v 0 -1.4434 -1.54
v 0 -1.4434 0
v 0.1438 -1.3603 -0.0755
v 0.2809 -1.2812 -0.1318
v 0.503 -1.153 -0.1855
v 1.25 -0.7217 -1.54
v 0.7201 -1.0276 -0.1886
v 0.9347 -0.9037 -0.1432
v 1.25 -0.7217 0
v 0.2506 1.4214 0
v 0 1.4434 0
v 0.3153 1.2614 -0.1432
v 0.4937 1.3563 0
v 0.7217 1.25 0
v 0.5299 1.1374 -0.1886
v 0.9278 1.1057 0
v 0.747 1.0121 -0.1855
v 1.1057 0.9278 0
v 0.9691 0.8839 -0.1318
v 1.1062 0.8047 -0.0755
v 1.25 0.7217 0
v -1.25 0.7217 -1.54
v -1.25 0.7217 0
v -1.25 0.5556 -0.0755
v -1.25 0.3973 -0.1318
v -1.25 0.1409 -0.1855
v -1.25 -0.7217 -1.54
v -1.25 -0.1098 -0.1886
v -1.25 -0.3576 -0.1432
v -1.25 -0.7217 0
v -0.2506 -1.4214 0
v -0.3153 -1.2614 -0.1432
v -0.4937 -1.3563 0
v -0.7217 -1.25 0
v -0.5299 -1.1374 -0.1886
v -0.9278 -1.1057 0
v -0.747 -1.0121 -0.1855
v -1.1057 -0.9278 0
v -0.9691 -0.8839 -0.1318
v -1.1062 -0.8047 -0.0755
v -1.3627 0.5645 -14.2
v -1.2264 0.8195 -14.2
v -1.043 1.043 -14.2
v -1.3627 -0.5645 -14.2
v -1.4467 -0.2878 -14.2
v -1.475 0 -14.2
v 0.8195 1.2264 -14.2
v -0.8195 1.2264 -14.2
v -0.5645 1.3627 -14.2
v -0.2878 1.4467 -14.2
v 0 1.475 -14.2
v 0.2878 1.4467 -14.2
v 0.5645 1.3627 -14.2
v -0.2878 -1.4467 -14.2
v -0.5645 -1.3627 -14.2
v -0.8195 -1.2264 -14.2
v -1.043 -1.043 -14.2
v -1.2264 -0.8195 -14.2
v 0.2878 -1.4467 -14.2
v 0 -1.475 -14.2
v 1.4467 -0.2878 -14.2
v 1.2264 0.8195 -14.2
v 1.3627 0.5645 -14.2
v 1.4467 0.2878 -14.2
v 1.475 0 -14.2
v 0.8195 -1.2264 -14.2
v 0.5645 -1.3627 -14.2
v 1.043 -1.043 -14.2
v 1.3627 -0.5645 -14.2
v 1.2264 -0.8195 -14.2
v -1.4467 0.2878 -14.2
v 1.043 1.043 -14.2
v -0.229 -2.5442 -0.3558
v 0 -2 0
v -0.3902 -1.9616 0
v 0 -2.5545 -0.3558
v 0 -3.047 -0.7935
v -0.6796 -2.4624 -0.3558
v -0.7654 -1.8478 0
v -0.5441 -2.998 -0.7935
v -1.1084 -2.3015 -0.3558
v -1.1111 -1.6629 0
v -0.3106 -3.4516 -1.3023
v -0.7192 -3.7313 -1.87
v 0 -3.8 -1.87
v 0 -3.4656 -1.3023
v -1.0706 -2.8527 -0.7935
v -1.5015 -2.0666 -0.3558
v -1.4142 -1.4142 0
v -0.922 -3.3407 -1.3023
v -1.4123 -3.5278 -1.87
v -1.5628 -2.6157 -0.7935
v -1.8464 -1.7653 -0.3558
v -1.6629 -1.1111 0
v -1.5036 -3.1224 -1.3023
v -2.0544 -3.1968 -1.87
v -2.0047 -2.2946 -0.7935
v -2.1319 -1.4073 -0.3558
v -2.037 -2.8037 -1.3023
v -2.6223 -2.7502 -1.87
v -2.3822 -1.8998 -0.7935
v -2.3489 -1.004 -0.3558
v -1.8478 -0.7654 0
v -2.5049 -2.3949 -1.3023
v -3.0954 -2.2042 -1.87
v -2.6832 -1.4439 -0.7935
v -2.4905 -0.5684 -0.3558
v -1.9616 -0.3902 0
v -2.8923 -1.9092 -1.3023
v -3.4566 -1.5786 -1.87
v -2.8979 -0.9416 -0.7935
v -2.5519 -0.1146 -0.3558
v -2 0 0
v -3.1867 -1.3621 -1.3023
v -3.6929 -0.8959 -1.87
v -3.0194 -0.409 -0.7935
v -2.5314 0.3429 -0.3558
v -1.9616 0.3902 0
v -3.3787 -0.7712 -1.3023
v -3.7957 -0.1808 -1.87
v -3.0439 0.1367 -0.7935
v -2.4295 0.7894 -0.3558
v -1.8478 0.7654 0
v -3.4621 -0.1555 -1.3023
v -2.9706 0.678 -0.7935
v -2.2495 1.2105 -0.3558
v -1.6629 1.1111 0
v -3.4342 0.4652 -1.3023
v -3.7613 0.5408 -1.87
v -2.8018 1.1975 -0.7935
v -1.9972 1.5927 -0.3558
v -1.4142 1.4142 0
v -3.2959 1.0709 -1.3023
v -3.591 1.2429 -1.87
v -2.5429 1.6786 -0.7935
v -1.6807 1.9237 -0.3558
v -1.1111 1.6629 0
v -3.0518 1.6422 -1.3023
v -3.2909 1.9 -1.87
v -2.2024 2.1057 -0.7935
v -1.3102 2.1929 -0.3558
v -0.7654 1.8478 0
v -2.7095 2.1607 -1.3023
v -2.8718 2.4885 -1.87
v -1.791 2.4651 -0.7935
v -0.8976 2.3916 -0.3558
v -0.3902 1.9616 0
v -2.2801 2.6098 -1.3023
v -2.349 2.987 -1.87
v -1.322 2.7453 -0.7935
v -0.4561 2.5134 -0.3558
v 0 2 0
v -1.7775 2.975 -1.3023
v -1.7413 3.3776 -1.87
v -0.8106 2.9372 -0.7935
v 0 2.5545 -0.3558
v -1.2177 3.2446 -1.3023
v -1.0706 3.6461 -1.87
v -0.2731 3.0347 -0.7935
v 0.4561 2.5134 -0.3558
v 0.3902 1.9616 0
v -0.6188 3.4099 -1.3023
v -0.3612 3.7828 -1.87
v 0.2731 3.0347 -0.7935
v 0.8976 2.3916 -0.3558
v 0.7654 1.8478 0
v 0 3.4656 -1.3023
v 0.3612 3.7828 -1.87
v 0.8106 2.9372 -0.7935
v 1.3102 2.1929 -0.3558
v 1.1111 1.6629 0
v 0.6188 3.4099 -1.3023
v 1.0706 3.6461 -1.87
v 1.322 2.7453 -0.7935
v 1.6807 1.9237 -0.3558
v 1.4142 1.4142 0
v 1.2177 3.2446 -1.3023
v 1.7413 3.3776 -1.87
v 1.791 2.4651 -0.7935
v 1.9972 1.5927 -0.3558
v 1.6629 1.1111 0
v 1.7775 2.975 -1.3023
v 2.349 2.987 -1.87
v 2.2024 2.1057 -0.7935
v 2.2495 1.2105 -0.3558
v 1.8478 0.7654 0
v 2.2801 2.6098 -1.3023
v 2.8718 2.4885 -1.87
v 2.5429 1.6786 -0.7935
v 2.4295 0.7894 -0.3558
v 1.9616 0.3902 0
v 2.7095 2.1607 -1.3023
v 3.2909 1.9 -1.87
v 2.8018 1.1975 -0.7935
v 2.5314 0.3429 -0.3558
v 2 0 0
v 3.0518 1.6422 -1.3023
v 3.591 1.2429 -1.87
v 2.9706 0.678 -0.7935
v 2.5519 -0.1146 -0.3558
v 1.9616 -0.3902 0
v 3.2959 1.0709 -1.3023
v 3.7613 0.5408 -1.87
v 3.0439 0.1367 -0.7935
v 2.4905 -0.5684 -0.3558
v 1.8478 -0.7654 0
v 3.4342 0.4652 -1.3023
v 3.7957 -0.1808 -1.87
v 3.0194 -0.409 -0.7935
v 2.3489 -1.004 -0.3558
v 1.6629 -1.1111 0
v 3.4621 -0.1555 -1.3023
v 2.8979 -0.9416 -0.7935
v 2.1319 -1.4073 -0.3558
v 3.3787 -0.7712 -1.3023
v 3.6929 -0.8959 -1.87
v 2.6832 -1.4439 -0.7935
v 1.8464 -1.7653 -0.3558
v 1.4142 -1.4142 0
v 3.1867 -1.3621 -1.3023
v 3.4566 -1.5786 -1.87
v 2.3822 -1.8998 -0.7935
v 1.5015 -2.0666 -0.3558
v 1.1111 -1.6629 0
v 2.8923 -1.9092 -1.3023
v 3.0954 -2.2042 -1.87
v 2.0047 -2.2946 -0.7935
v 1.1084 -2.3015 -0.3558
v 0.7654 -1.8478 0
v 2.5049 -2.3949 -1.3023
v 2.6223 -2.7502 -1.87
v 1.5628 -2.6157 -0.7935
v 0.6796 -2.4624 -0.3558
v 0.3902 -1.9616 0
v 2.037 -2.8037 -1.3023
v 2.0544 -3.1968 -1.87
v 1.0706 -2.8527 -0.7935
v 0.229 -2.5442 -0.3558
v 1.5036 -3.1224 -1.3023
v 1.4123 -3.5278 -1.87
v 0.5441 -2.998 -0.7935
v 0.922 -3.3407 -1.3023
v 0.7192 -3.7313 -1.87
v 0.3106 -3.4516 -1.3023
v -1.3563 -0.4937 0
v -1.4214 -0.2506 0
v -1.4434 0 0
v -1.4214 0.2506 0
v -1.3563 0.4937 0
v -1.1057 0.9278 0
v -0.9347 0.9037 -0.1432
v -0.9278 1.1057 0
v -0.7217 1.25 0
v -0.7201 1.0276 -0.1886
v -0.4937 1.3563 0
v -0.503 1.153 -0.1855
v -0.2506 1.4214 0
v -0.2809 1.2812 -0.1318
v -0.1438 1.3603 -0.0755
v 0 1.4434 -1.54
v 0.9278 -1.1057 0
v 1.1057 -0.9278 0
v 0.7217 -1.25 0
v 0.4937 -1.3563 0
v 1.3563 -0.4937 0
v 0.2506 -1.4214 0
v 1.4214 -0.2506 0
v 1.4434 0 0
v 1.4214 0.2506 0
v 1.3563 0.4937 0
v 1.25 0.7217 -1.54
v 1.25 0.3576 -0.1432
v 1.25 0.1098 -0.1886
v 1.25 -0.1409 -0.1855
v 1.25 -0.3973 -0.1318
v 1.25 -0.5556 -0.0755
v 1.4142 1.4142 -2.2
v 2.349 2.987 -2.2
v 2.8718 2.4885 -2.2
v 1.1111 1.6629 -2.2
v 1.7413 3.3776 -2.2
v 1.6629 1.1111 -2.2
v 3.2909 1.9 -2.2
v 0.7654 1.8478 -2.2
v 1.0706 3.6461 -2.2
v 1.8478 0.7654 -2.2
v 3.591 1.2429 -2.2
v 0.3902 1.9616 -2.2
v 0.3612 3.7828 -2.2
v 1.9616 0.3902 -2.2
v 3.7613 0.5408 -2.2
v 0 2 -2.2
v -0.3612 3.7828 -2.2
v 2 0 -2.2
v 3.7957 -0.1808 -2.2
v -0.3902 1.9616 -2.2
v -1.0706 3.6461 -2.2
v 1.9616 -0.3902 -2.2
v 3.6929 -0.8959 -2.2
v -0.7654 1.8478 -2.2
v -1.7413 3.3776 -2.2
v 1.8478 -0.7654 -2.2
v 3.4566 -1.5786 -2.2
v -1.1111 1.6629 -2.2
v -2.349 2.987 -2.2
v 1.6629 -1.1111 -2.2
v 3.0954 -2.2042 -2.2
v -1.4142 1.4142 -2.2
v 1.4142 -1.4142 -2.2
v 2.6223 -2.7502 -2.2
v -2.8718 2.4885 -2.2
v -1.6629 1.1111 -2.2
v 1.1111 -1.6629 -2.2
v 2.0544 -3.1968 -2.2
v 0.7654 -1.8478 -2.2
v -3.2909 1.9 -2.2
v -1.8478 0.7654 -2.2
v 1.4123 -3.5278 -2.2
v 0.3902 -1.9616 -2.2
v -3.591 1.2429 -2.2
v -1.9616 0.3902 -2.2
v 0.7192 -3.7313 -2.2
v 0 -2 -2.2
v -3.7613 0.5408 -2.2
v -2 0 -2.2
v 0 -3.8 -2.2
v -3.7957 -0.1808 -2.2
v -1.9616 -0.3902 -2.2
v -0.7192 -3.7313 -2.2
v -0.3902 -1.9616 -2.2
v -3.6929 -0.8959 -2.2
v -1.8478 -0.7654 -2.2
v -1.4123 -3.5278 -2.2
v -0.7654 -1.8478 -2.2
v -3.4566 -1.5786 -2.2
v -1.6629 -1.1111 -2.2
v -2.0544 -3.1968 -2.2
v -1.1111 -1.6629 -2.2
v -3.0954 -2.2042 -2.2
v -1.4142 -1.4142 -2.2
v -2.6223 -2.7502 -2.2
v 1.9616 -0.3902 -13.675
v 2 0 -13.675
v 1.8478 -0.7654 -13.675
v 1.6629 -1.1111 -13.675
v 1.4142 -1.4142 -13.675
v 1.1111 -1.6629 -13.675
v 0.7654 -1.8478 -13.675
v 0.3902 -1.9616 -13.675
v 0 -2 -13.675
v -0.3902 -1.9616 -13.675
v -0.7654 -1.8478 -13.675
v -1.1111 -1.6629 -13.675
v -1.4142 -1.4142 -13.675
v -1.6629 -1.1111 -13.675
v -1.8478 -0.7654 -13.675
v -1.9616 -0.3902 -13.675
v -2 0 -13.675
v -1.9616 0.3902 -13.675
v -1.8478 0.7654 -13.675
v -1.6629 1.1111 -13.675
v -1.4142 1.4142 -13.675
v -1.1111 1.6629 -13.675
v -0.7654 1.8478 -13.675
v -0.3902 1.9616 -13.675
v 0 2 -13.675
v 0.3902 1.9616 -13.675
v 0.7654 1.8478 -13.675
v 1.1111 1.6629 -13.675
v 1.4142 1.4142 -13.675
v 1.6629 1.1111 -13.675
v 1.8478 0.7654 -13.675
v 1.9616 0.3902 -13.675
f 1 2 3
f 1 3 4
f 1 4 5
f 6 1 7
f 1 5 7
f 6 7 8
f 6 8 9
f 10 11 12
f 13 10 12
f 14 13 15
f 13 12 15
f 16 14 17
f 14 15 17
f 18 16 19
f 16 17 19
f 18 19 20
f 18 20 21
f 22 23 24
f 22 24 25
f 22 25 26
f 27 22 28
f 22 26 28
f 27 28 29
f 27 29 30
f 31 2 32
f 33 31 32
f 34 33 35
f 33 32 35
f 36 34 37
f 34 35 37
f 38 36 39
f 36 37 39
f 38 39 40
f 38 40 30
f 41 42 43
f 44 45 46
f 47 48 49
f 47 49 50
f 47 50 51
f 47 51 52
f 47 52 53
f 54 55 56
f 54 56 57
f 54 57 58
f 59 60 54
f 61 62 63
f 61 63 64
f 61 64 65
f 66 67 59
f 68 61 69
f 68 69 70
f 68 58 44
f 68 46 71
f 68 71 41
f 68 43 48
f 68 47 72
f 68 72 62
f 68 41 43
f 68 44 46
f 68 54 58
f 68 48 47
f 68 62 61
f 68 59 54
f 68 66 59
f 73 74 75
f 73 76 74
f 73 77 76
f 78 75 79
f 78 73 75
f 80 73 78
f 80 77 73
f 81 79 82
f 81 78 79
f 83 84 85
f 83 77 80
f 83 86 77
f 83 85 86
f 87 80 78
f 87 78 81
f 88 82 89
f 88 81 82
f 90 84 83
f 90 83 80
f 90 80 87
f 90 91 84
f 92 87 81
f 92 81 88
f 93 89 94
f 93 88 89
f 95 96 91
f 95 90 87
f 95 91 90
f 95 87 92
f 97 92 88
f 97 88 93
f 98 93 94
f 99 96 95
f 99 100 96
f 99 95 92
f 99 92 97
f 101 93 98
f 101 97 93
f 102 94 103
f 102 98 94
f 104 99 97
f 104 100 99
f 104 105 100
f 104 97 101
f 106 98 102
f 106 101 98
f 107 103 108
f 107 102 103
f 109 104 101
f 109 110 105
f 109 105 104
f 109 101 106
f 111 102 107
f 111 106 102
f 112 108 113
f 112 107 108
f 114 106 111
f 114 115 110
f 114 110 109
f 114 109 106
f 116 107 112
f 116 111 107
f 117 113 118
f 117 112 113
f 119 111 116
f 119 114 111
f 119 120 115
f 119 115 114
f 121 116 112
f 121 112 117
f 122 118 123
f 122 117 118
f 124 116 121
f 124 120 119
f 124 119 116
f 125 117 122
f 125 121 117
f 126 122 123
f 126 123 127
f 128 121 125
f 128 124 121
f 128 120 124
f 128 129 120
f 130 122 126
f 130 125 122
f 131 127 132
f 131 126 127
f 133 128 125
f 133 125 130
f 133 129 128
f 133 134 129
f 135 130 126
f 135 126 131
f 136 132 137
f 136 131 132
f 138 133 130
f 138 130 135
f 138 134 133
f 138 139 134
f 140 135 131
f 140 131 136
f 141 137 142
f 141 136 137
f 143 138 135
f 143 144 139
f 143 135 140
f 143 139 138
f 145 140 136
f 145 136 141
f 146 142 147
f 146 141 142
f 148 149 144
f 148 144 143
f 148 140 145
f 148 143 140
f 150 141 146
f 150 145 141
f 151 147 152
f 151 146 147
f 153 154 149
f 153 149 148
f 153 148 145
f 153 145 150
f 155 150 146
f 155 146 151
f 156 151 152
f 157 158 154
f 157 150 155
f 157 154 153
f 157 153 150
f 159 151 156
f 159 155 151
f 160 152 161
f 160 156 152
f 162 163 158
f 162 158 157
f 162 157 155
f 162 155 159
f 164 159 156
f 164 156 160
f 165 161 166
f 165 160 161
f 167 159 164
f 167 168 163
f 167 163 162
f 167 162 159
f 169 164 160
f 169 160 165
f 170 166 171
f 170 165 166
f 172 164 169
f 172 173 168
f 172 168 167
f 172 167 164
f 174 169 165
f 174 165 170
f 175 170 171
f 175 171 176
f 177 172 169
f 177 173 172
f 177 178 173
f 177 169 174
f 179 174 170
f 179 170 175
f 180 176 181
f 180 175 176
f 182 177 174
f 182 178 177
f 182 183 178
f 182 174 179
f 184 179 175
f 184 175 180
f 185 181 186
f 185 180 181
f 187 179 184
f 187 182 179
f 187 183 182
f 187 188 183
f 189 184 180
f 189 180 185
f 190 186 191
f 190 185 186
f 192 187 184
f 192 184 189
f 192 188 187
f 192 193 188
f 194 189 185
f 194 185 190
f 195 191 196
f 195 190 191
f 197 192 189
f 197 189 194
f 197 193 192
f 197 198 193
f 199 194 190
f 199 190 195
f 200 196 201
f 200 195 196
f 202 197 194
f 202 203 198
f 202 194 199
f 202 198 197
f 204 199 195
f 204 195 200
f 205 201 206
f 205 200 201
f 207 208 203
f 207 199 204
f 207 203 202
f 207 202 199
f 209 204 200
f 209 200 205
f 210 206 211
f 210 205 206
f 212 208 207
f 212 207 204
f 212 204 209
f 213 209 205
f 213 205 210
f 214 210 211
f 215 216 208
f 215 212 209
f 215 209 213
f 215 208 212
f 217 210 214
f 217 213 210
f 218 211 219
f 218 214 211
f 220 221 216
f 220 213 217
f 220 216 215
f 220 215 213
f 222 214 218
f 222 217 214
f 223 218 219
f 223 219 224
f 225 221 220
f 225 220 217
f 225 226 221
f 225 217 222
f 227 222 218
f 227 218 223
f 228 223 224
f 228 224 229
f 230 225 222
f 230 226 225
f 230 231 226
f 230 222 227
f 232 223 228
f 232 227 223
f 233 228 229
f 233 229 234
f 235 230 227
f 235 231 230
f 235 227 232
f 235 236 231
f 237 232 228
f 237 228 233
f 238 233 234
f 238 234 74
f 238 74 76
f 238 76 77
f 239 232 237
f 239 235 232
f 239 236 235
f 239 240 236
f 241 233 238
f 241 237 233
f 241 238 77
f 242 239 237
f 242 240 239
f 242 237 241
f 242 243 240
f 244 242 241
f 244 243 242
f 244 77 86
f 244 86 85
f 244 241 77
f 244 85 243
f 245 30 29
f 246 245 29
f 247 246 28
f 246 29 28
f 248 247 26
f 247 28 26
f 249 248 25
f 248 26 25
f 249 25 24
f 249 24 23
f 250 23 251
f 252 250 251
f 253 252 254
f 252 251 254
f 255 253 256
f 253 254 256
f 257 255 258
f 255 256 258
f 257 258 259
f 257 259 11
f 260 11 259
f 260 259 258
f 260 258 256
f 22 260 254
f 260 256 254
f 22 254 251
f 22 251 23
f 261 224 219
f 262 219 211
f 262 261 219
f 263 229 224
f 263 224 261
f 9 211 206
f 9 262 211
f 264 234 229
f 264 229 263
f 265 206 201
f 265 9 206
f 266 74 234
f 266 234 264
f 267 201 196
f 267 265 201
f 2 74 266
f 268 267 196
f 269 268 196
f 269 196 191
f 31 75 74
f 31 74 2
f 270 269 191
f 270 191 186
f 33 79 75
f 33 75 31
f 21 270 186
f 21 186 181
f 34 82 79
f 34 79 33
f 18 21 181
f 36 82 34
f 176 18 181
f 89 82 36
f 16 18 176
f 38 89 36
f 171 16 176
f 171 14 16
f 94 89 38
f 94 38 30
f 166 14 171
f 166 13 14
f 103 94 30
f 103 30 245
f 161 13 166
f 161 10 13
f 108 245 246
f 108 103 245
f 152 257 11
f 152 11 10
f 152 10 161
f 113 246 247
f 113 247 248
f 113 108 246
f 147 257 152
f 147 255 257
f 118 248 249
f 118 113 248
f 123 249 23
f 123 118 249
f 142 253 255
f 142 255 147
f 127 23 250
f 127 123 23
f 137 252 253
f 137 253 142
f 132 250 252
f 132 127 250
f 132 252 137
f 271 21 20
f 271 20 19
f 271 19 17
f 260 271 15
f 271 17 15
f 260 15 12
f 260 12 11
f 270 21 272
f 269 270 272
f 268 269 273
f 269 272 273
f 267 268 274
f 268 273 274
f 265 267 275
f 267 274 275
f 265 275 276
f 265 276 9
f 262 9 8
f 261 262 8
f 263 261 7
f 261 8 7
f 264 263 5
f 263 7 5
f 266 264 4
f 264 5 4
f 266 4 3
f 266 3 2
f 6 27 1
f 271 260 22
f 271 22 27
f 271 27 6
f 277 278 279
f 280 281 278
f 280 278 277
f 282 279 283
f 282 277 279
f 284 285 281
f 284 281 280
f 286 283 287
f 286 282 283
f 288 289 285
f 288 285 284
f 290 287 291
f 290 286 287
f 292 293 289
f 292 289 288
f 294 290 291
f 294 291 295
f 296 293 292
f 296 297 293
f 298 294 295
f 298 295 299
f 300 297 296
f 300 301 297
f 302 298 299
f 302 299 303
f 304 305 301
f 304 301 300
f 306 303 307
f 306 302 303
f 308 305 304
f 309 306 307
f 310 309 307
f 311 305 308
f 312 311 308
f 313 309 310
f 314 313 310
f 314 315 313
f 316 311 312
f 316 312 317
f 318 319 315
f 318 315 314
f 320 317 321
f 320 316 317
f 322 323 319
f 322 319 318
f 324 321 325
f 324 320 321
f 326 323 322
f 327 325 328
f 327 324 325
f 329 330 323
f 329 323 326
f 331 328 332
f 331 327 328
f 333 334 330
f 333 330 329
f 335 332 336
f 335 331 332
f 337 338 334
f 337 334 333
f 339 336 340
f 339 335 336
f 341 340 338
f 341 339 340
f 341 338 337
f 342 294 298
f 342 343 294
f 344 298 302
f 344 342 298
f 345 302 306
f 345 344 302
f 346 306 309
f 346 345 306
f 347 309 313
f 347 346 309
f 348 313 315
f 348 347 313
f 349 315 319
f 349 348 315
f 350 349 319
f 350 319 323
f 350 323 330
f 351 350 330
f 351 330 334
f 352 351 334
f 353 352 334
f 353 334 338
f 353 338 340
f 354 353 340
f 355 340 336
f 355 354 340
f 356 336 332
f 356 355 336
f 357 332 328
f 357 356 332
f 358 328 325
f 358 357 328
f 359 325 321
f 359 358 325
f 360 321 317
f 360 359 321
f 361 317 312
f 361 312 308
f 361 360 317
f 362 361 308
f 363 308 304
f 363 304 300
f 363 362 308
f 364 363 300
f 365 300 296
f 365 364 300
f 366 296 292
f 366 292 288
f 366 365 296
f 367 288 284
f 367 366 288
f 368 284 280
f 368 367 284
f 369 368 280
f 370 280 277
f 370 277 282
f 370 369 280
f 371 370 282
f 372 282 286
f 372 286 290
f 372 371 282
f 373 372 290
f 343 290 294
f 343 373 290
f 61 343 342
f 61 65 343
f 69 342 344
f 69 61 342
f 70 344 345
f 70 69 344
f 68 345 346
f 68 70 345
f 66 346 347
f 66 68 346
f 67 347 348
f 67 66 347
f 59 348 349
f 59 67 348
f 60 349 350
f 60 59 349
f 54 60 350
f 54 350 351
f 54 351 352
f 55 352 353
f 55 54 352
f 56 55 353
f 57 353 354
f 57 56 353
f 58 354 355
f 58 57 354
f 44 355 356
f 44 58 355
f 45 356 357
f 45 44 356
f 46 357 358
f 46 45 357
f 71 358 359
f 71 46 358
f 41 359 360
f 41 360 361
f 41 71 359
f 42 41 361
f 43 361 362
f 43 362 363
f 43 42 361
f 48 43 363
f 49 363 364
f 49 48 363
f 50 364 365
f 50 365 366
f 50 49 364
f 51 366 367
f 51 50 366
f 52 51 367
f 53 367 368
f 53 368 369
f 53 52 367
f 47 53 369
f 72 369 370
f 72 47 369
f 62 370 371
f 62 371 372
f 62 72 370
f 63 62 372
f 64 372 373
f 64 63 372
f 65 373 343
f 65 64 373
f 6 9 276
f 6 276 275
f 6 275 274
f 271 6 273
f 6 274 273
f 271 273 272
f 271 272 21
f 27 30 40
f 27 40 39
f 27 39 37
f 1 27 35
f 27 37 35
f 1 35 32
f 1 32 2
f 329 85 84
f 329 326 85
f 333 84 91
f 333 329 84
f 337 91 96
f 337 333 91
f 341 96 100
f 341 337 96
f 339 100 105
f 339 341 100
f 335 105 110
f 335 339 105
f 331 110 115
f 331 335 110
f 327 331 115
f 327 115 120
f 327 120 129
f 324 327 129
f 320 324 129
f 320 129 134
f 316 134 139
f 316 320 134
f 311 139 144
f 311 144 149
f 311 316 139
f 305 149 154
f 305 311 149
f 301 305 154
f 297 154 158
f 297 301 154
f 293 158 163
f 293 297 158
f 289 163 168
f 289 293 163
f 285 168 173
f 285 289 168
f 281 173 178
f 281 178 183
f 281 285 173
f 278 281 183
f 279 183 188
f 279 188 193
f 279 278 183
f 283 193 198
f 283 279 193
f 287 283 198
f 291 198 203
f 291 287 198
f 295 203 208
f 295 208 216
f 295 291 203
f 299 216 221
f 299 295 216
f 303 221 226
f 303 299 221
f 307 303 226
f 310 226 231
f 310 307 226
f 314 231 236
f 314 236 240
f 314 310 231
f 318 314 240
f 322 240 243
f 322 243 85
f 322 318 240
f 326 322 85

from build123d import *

# Parameters (mm, degrees)
CUT_EXTRUDE2_DEPTH = 1.54


with BuildPart() as part:
    # Sketch10 → Revolve3 (revolve)
    with BuildSketch(Plane(origin=(0, 0, 0), x_dir=(0, 0, -1), z_dir=(1, 0, 0)), mode=Mode.PRIVATE) as revolve3_sk:
        Polygon((13.675, 2), (14.2, 1.475), (14.2, 0), (2.2, 0), (2.2, 2), align=None)
    revolve(revolve3_sk.sketch.rotate(Axis((0, 0, 0), (0, 0, -1)), 90), axis=Axis((0, 0, 0), (0, 0, -1)))

    # Sketch7 → Revolve2 (revolve)
    with BuildSketch(Plane(origin=(0, 0, 0), x_dir=(0, 0, -1), z_dir=(1, 0, 0)), mode=Mode.PRIVATE) as revolve2_sk:
        with BuildLine():
            Line((1.87, 3.8), (2.2, 3.8))
            Line((2.2, 3.8), (2.2, 0))
            Line((2.2, 0), (0, 0))
            Line((0, 0), (0, 2))
            ThreePointArc((0, 2), (0.793500147, 3.047002626), (1.87, 3.8))
        make_face()
    revolve(revolve2_sk.sketch.rotate(Axis((0, 0, 0), (0, 0, -1)), 180), axis=Axis((0, 0, 0), (0, 0, -1)))

    # Sketch5 → Cut-Extrude2 (cut)
    with BuildSketch(Plane.XY):
        Polygon((1.25, -0.721687836), (1.25, 0.721687836), (0, 1.443375673), (-1.25, 0.721687836), (-1.25, -0.721687836), (0, -1.443375673), align=None)
    extrude(amount=-CUT_EXTRUDE2_DEPTH, mode=Mode.SUBTRACT)

    # Cut-Extrude3 cone 1 section (through the dimple's axis) → Cut-Extrude3 (revolve, cut)
    with BuildSketch(Plane(origin=(0, 0, 0), x_dir=(0, -1, 0), z_dir=(1, 0, 0))):
        Polygon((0, 0), (1.443375673, 0), (0, 1.443375673), align=None)
    revolve(axis=Axis((0, 0, 0), (0, 0, -1)), mode=Mode.SUBTRACT)


with BuildPart() as body_2:
    # Split1: read off the stored shape, not the designer's step
    # Split1: the piece on the far side of the plane
    add(part.part)
    split(bisect_by=Plane.XY.offset(-2.2), keep=Keep.BOTTOM)


with BuildPart() as part_1:
    add(part.part)

    # Split1
    split(bisect_by=Plane.XY.offset(-2.2), keep=Keep.TOP)


with BuildPart() as body_2_1:
    add(body_2.part)

    # Boss-Extrude1: read off the stored shape, not the designer's step
    # Boss-Extrude1: union part
    add(part_1.part)


solid = body_2_1.part
